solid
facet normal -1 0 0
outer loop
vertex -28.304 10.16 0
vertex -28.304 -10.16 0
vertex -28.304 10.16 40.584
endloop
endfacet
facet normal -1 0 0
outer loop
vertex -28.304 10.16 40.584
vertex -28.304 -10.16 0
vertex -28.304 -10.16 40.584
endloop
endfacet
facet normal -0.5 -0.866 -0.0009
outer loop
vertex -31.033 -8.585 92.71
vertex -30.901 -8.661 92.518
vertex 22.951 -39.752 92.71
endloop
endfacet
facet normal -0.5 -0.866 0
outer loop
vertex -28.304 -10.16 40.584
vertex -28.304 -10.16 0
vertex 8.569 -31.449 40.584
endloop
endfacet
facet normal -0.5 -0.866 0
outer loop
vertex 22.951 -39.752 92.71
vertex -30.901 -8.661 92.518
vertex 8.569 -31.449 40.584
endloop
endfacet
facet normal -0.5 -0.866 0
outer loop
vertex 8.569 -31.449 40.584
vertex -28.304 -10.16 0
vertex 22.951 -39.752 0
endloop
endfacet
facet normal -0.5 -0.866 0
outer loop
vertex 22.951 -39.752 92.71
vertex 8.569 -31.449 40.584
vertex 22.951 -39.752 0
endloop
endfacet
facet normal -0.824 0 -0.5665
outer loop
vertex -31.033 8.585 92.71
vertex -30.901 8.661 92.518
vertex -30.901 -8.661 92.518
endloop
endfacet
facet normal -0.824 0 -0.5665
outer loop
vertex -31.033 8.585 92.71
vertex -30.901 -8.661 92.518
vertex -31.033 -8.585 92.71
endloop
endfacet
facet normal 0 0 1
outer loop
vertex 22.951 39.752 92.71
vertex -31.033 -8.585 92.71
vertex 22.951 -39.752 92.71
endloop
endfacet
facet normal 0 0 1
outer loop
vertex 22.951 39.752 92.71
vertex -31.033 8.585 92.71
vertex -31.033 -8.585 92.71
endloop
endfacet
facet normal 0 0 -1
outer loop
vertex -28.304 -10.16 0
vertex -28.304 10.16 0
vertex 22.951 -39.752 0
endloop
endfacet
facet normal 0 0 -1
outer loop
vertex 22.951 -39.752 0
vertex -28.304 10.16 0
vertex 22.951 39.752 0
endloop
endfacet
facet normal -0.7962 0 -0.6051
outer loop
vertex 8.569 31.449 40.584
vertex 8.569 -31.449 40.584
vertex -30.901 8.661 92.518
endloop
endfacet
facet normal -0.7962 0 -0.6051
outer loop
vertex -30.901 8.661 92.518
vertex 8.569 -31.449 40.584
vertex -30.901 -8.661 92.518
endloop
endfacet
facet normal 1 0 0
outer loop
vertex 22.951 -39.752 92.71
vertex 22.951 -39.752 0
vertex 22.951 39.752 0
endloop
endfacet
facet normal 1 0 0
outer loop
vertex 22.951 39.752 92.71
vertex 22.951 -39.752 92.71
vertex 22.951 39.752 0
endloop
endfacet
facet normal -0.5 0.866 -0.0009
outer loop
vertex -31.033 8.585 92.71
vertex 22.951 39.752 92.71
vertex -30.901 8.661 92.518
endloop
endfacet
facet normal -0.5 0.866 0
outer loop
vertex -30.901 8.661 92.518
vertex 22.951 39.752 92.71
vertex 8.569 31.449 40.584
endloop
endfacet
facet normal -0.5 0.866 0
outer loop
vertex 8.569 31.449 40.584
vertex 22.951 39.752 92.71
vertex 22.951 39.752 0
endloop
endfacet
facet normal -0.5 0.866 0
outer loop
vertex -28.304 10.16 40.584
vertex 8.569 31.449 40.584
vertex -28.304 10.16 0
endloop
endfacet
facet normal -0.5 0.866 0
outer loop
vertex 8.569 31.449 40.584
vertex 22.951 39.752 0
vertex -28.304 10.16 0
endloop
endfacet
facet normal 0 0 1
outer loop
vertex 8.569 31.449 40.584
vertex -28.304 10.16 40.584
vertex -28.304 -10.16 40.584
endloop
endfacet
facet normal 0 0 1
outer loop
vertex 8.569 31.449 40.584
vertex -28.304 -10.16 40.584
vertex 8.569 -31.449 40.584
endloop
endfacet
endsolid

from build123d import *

# Parameters (mm, degrees)
F1_DEPTH = 92.71
F4_DEPTH = 539.242


with BuildPart() as f1:
    # F0 (on Top) → F1 (new body)
    with BuildSketch(Plane.XY):
        Polygon((22.950954, -39.752218), (22.950954, 39.752218), (-45.901908, 0), align=None)
    extrude(amount=F1_DEPTH)

    # F3 (on offset) → F4 (cut)
    with BuildSketch(Plane.XZ.offset(254)):
        Polygon((-61.28243, 96.673079), (-61.28243, 0), (-28.304175, 0), (-28.304175, 40.58408), (8.569154, 40.58408), (-30.900886, 92.518345), (-33.757269, 96.673079), align=None)
    extrude(amount=-F4_DEPTH, mode=Mode.SUBTRACT)


solid = f1.part
